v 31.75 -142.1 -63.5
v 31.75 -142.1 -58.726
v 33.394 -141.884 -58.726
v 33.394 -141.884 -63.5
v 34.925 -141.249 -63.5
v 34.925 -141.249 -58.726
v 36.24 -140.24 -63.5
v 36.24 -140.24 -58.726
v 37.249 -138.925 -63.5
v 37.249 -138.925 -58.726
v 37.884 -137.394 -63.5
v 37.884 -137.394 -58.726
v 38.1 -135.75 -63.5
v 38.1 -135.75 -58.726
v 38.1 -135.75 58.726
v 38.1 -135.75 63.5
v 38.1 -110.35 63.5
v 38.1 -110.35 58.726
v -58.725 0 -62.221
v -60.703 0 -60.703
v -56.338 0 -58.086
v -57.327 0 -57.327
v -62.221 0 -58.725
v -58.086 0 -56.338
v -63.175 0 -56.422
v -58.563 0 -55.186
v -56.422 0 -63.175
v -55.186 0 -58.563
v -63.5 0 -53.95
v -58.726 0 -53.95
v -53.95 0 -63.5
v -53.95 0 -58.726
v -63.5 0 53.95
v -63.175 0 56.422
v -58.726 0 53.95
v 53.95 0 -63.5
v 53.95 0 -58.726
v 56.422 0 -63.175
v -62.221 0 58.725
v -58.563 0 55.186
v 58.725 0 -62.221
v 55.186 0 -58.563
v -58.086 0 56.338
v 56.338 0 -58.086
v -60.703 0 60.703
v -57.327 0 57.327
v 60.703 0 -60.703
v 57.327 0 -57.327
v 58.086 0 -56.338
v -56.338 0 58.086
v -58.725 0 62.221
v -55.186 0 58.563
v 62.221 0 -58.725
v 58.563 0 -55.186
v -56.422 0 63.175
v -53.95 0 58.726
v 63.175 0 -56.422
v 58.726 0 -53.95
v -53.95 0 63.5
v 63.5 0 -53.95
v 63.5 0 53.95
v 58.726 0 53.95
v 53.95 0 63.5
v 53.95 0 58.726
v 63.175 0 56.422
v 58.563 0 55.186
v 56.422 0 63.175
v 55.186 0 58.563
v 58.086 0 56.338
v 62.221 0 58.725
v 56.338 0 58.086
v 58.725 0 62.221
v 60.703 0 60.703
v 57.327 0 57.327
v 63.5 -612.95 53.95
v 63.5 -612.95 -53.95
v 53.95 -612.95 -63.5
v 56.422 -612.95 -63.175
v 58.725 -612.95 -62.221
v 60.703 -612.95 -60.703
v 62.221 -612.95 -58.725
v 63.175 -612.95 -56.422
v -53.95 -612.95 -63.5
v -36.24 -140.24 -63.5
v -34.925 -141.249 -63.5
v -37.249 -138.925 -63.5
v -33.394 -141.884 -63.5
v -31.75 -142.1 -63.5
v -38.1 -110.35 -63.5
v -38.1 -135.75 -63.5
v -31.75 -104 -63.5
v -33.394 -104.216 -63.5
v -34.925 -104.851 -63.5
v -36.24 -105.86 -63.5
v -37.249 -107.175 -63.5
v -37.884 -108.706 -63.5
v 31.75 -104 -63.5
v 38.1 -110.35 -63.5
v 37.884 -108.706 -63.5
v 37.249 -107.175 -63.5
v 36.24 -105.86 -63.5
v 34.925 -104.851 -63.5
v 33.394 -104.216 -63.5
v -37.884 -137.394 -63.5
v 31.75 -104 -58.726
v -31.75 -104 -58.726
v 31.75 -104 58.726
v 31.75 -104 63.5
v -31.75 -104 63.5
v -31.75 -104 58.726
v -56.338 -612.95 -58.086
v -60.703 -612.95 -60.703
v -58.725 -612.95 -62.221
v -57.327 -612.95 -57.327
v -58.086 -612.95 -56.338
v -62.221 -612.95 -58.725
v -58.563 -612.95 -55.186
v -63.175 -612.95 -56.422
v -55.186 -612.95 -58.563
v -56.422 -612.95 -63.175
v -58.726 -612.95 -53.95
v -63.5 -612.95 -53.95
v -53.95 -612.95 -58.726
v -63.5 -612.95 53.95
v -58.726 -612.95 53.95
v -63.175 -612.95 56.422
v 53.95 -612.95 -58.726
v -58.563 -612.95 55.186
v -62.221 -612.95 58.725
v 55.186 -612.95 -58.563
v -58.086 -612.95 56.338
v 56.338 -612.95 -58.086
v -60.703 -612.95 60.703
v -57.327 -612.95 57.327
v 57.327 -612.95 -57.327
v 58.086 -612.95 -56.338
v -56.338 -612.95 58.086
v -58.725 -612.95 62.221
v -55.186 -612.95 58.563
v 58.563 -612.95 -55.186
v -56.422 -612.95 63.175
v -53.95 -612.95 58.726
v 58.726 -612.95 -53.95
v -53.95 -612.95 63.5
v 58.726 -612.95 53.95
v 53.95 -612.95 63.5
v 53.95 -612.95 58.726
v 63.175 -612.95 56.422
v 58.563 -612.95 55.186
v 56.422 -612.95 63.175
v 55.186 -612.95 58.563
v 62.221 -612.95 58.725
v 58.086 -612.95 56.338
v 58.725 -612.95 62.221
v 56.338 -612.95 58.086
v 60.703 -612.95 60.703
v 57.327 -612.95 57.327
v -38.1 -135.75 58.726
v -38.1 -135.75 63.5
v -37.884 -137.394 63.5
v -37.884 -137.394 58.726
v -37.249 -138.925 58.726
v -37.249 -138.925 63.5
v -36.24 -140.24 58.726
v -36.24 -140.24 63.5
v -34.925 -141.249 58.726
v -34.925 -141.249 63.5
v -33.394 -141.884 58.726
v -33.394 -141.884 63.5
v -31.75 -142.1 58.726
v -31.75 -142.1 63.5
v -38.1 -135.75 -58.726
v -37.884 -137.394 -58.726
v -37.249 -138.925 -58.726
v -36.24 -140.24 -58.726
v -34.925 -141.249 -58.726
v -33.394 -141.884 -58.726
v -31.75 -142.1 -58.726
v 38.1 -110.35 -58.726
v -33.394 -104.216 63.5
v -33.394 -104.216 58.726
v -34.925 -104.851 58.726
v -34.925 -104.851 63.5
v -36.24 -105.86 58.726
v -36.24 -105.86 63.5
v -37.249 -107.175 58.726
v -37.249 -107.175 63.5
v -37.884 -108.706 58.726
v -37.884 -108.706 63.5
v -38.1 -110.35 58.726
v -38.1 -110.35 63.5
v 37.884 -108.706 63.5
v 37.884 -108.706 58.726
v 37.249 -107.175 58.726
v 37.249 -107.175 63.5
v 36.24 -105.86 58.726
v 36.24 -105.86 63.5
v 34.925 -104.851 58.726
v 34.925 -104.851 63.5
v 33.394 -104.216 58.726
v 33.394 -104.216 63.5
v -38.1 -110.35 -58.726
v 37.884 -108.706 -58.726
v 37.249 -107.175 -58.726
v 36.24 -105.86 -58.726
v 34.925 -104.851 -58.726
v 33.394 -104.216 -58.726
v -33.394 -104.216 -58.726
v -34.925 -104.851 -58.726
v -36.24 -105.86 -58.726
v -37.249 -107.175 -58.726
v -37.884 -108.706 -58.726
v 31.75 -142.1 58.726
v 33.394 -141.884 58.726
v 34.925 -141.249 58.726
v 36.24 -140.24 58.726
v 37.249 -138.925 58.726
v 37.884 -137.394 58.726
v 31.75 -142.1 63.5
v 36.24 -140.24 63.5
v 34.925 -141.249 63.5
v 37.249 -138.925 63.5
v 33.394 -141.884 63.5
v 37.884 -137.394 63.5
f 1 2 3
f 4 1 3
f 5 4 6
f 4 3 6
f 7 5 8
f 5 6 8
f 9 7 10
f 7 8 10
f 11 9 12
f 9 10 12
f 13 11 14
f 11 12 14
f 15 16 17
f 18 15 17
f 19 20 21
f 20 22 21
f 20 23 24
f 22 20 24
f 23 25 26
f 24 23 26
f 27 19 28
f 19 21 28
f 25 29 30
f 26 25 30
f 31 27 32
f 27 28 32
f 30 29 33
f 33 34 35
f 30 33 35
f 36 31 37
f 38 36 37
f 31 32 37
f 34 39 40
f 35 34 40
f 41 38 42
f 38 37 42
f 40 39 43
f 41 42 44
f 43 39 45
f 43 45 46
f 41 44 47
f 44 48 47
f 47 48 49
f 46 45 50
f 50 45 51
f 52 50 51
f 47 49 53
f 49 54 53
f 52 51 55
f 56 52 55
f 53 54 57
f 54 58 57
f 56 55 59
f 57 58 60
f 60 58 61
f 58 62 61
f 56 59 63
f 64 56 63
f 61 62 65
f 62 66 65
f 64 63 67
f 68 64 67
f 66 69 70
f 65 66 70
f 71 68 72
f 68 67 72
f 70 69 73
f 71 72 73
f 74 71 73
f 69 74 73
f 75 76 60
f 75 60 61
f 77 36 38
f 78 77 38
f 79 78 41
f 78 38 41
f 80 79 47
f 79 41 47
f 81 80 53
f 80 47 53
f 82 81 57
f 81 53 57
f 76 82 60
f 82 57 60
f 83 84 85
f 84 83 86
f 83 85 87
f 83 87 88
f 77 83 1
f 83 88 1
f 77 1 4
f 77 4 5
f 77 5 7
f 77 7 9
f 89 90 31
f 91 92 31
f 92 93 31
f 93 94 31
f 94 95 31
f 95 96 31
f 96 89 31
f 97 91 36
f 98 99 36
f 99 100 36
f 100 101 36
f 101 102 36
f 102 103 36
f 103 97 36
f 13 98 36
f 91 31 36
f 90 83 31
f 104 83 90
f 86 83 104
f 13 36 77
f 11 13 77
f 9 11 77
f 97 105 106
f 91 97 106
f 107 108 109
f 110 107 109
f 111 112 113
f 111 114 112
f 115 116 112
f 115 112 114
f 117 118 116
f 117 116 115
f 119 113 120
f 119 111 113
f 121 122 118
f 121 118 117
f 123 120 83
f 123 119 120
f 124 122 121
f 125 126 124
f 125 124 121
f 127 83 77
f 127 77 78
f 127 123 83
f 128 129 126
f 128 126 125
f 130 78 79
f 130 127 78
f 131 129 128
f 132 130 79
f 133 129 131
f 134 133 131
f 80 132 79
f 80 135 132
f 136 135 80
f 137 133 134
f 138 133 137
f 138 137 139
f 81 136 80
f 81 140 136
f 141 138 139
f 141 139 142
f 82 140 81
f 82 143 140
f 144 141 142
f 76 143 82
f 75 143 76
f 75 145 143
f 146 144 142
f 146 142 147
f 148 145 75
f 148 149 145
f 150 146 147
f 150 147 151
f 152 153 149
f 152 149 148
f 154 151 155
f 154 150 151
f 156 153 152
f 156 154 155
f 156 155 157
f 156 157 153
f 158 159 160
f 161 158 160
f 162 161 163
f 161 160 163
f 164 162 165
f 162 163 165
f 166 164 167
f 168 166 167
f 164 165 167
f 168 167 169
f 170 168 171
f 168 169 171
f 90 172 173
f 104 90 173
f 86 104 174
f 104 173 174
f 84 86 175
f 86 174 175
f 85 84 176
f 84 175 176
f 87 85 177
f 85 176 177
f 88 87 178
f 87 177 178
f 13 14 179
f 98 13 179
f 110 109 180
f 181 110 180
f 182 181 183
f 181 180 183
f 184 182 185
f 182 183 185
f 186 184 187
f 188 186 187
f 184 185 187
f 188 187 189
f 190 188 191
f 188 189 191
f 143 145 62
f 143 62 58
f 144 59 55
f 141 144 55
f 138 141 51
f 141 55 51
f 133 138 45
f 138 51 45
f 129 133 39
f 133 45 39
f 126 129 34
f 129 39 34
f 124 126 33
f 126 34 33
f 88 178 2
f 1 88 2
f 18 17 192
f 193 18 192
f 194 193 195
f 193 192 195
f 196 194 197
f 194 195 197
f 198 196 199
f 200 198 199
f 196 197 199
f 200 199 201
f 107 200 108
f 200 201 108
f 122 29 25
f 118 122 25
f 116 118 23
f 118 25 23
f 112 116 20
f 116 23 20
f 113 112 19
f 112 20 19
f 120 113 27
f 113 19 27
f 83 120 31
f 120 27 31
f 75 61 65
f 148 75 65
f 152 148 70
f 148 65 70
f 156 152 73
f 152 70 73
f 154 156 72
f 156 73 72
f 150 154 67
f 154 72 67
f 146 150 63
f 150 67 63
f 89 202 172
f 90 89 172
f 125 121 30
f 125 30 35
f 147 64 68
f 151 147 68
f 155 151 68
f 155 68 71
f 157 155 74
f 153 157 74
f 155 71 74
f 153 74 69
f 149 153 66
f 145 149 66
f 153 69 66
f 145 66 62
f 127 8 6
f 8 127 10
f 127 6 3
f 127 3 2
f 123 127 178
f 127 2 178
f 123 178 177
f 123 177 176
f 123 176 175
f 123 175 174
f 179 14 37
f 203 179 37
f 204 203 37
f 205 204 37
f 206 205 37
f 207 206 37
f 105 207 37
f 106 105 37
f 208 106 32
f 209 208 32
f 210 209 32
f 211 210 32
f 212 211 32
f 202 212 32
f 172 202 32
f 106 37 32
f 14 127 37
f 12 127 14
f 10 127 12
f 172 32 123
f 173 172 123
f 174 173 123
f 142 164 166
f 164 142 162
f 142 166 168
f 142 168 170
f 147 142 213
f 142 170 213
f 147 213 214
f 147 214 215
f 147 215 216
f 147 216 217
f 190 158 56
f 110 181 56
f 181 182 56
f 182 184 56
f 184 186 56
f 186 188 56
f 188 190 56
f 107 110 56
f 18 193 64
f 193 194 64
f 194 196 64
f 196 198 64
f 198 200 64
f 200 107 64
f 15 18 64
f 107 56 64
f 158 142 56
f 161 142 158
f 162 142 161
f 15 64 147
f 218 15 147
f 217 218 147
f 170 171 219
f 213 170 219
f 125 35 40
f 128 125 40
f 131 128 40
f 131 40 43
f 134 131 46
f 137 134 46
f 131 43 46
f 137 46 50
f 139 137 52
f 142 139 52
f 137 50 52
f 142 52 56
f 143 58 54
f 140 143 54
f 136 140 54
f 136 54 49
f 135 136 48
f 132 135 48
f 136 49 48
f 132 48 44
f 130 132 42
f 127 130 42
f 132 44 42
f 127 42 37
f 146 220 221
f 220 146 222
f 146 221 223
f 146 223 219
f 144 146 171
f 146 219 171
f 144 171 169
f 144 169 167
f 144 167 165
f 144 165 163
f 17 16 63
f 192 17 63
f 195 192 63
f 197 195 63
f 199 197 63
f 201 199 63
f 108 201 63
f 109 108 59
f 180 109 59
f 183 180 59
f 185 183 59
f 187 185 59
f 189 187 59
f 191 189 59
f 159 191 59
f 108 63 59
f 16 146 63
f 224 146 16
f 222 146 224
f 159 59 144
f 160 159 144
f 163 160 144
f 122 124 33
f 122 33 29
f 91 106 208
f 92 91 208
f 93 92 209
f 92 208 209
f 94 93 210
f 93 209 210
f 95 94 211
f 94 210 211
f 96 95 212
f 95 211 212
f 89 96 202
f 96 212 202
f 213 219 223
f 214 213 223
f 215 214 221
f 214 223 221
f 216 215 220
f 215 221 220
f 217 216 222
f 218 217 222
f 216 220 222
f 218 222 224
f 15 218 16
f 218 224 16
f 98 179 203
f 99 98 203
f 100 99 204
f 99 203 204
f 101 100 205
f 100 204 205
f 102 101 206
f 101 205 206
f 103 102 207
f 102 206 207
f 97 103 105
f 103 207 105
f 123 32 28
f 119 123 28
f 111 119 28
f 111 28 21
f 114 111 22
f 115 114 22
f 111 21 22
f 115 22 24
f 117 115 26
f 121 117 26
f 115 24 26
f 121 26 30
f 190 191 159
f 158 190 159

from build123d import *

# Parameters (mm, degrees)
F1_DEPTH = 612.95
F3_DEPTH = 127.001


with BuildPart() as f1:
    # F0 (on Front) → F1 (new body)
    with BuildSketch(Plane.XZ):
        with BuildLine():
            Line((-53.95, -63.5), (53.95, -63.5))
            ThreePointArc((53.95, -63.5), (60.70287, -60.70287), (63.5, -53.95))
            Line((63.5, -53.95), (63.5, 53.95))
            ThreePointArc((63.5, 53.95), (60.70287, 60.70287), (53.95, 63.5))
            Line((53.95, 63.5), (-53.95, 63.5))
            ThreePointArc((-53.95, 63.5), (-60.70287, 60.70287), (-63.5, 53.95))
            Line((-63.5, 53.95), (-63.5, -53.95))
            ThreePointArc((-63.5, -53.95), (-60.70287, -60.70287), (-53.95, -63.5))
        make_face()
        with BuildLine():
            ThreePointArc((58.7255, -53.9505), (57.326935, -57.326935), (53.9505, -58.7255))
            Line((53.9505, -58.7255), (-53.9505, -58.7255))
            ThreePointArc((-53.9505, -58.7255), (-57.326935, -57.326935), (-58.7255, -53.9505))
            Line((-58.7255, -53.9505), (-58.7255, 53.9505))
            ThreePointArc((-58.7255, 53.9505), (-57.326935, 57.326935), (-53.9505, 58.7255))
            Line((-53.9505, 58.7255), (53.9505, 58.7255))
            ThreePointArc((53.9505, 58.7255), (57.326935, 57.326935), (58.7255, 53.9505))
            Line((58.7255, 53.9505), (58.7255, -53.9505))
        make_face(mode=Mode.SUBTRACT)
    extrude(amount=F1_DEPTH)

    # F2 (on face) → F3 (cut, through all)
    with BuildSketch(Plane.XY.offset(63.5)):
        with BuildLine():
            Line((-31.75, -142.1), (31.75, -142.1))
            ThreePointArc((31.75, -142.1), (36.240128, -140.240128), (38.1, -135.75))
            Line((38.1, -135.75), (38.1, -110.35))
            ThreePointArc((38.1, -110.35), (36.240128, -105.859872), (31.75, -104))
            Line((31.75, -104), (-31.75, -104))
            ThreePointArc((-31.75, -104), (-36.240128, -105.859872), (-38.1, -110.35))
            Line((-38.1, -110.35), (-38.1, -135.75))
            ThreePointArc((-38.1, -135.75), (-36.240128, -140.240128), (-31.75, -142.1))
        make_face()
    extrude(amount=-F3_DEPTH, mode=Mode.SUBTRACT)


solid = f1.part
